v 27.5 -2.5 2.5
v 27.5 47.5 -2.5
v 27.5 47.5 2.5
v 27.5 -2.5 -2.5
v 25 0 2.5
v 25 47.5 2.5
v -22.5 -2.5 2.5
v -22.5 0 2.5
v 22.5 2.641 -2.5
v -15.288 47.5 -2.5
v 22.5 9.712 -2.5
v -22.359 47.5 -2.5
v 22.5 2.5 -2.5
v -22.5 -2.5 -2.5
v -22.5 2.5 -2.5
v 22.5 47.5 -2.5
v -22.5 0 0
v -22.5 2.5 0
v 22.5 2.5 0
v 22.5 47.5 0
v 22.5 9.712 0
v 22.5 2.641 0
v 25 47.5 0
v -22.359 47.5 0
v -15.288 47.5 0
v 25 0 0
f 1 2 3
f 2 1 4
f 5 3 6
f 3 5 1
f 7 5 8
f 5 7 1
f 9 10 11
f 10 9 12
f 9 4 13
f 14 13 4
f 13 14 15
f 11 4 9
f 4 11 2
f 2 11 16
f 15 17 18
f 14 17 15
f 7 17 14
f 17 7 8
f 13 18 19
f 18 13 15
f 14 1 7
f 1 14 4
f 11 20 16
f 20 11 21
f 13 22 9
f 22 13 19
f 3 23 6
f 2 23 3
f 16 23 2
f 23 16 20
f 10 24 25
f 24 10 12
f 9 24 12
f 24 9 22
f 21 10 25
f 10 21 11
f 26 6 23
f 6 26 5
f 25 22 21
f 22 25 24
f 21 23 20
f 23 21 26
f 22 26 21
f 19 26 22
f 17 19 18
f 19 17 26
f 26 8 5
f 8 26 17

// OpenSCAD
//use <sc.scad> needed to be included due to customizer not being able to import libs

h=5;
w=50;
t=5;
sharpie=0.1;

D(){intersection(){Cu(w+t,2*(w-t/2),h);U(){Tx(t/2)Cu(w,t,h);
T(w/2,w/2-t/2,0)Cu(t,w,h);
T(w/2,0,0)Rz(45)T(t/2+sharpie,w/2+2*t,0)Cu(t,sqrt(2)*w-t,h);}}
T(0,w/2,h/2)Cu(w,w,h);}



//========================================
// ShortCuts.scad 
// Autor: Rudolf Huttary, Berlin 2015
//
$fn = 100; 


//show_examples(); 

module show_examples()
	place_in_rect(30, 30)
	{
		Cy(h = 10); 
		CyH(h = 10); 
		CyH(h = 10, w = 30); 
		CyS(h = 10); 
		CyS(h = 10, w1 = 25, w2 = 75); 
		Cu(10); 
		Ri(h = 10); 
		RiH(h = 10); 
		RiS(h = 10, w1 = 10); 
		RiS(h = 10, w1 = 30, w2 = 300); 
		Sp(); 
		SpH(10, 30, 30); 
	}



module help()
{
echo("==============="); 
echo("help(): shows this help"); 
echo("show_examples(): shows some examples"); 
echo("place_in_rect(): places children objects in grid"); 
echo("Transformations:"); 
echo(" transform :  T(x=0, y=0, z=0), Tx(x=0) , Ty(y=0), Tz(z=0)"); 
echo(" rotate :  R(x=0, y=0, z=0), Rx(x=0) , Ry(y=0), Rz(z=0)"); 
echo(" scale :  S(x=1, y=1, z=1), Sx(x=1) , Sy(y=1), Sz(z=1)"); 
echo("Logical"); 
echo(" difference :  D()"); 
echo(" union :  U()"); 
echo(" intersection : *missing*"); 
echo("Primitives"); 
echo(" circle :  Ci(r=10)"); 
echo(" circle_half :  CiH(r=10, w=0)")
echo(" circle_segment :  CiS(r=10, w1=0, w2=90)")
echo(" square :  Sq(x=10, y=0, center=true))"); 
echo(" cylinder :  Cy(r=10, h=1, center=true)"); 
echo(" cylinder_half :  CyH(r=10, w=0)")
echo(" cylinder_segment: CyS(r=10, h=1, w1=0, w2=90,center=true)"); 
echo(" cylinder_segment: Pie(r=10, h=1, w1=0, w2=90,center=true)"); 
echo(" cube :  Cu(x=10, y=0, z=10, center=true)"); 
echo(" ring :  Ri(R=10, r=5, h=1, center=true)"); 
echo(" ring_half :  RiH(R=10, r=5, h=1, w=0 center=true)"); 
echo(" ring_segment :  RiS(R=10, r=5, h=1, w1=0, w2=90, center=true)"); 
echo(" sphere:  Sp(r=10))"); 
echo(" sphere_half:  SpH(r=10, w1 = 0, w2 = 0))"); 
echo("==============="); 
}


// Euclidean Transformations

module T(x=0, y=0, z=0){translate([x, y, z])children(); }
module Tx(x) { translate([x, 0, 0])children(); }
module Ty(y) { translate([0, y, 0])children(); }
module Tz(z) { translate([0, 0, z])children(); }


module R(x=0, y=0, z=0){rotate([x, y, z]) children();}
module Rx(x=90){rotate([x, 0, 0]) children();}
module Ry(y=90){rotate([0, y, 0]) children();}
module Rz(z=90){rotate([0, 0, z]) children();}

module S(x=1, y=1, z=1){scale([x, y, z]) children();}
module Sx(x=1){scale([x, 1, 1]) children();}
module Sy(y=1){scale([1, y, 1]) children();}
module Sz(z=1){scale([1, 1, z]) children();}


module D() difference(){children(0); children([1:$children-1]);}
module U() children([0:$children-1]);
// module I() intersection()children([0:$children-1]); // does not work for some reason


// primitives - 2D

module Sq(x =10, y = 0, center = true)
{
   if(y==0)
		square([x, x], center = center); 
	else
		square([x, y], center = center); 
}
module Ci(r = 10)
{
	circle(r = r); 
}

// derived primitives - 2d
module CiH(r = 10, w = 0)
  circle_half(r, w); 

module CiS(r = 10, w1 = 0, w2 = 90)
  circle_segment(r, w1, w2); 


// primitives - 3d
module Cy(r = 10, h = 1, center = true)
{
	cylinder(r = r, h = h, center = center); 
}
module Cu(x = 10, y = 0, z = 10, center = true)
{
  if (y==0)
	cube([x, x, x], center = center); 
  else
	cube([x, y, z], center = center); 
}

// derived primitives - 3d
module CyH(r = 10, h = 1, w = 0, center = true)
  cylinder_half(r, h, w, center); 

module CyS(r = 10, h = 1, w1 = 0, w2 = 90, center = true)
  cylinder_segment(r, h, w1, w2, center); 

module Ri(R = 10, r = 5, h = 1, center = true)
  ring(R, r, h, center); 

module RiS(R = 10, r = 5, h = 1, w1 = 0, w2 = 90, center = true)
   ring_segment(R, r, h, w1, w2, center); 

module RiH(r1 = 10, r2, h = 1, w = 0, center = true)
   ring_half(r1, r2, h, w, center); 
module Pie(r = 10, h = 1, w1 = 0, w2 = 90, center = true)
  cylinder_segment(r, h, w1, w2, center);  
module Sp(r = 10)
  sphere(r); 
module SpH(r = 10, w1 = 0, w2 = 0)
  sphere_half(r, w1, w2); 
module SpS(r = 10, w1 = 0, w2 = 90, w3 = 90)
  sphere_segment(r, w1, w2); 




// clear text definitions
module circle_half(r = 10, w = 0)
{
	difference()
	{
		circle(r); 
     rotate([0, 0, w-90])
     translate([0, -r])
		square([r, 2*r], center = false); 
	}
}

module circle_segment(r = 10, w1 = 0, w2 = 90)
{
  W2 = (w1>w2)?w2+360:w2; 
  if (W2-w1 < 180)
    intersection()
		{
       circle_half(r, w1); 
       circle_half(r, W2-180); 
 		}
	else
    union()
		{
       circle_half(r, w1); 
       circle_half(r, W2-180); 
 		}
}

module cylinder_half(r = 10, h = 1, w = 0, center = true)
{
  linear_extrude(height = h, center = center)
  circle_half(r, w); 
} 

module cylinder_segment(r = 10, h = 1, w1 = 0, w2 = 90, center = true)
{
  linear_extrude(height = h, center = center)
  circle_segment(r, w1, w2); 
} 

module ring(R = 10, r = 5, h = 1, center = true)
{
	difference()
	{
	cylinder(r = R, h = h, center = center); 
   translate([0, 0, -2*h])
	cylinder(r = r, h = 4*h, center = false); 
	}
}

module ring_half(R = 10, r = 5, h = 1, w = 0, center = true)
{
	difference()
	{
		ring(R, r, h, center); 
     rotate([0, 0, w])
     translate([0, -R/2, 0])
		cube([2*R, R, 3*h], center = true); 
	}
}

module ring_segment(R = 10, r = 5, h = 1, w1 = 0, w2 = 90, center = true)
{
  W2 = (w1>w2)?w2+360:w2; 
  if (W2-w1 < 180)
    intersection()
		{
       ring_half(R, r, h, w1, center); 
       ring_half(R, r, h, W2-180, center); 
 		}
	else
    union()
		{
       ring_half(R, r, h, w1, center); 
       ring_half(R, r, h, W2-180, center); 
 		}
}


module sphere_half(r = 10, w1 = 0, w2 = 0)
{  
	difference()
	{
   	sphere(r); 
      rotate([-w1, -w2, 0])
     	translate([0, 0, r])
		cube(2*r, 2*r, r, center = true); 
	}

}


// additional code
module place_in_rect(dx =20, dy=20)
{
  cols = ceil(sqrt($children)); 
  rows = floor(sqrt($children)); 
  for(i = [0:$children-1])
	{ 
	  T(dx*(-cols/2+(i%cols)+.5), dy*(rows/2-floor(i/cols)-.5))
		 children(i); 
	}
}
